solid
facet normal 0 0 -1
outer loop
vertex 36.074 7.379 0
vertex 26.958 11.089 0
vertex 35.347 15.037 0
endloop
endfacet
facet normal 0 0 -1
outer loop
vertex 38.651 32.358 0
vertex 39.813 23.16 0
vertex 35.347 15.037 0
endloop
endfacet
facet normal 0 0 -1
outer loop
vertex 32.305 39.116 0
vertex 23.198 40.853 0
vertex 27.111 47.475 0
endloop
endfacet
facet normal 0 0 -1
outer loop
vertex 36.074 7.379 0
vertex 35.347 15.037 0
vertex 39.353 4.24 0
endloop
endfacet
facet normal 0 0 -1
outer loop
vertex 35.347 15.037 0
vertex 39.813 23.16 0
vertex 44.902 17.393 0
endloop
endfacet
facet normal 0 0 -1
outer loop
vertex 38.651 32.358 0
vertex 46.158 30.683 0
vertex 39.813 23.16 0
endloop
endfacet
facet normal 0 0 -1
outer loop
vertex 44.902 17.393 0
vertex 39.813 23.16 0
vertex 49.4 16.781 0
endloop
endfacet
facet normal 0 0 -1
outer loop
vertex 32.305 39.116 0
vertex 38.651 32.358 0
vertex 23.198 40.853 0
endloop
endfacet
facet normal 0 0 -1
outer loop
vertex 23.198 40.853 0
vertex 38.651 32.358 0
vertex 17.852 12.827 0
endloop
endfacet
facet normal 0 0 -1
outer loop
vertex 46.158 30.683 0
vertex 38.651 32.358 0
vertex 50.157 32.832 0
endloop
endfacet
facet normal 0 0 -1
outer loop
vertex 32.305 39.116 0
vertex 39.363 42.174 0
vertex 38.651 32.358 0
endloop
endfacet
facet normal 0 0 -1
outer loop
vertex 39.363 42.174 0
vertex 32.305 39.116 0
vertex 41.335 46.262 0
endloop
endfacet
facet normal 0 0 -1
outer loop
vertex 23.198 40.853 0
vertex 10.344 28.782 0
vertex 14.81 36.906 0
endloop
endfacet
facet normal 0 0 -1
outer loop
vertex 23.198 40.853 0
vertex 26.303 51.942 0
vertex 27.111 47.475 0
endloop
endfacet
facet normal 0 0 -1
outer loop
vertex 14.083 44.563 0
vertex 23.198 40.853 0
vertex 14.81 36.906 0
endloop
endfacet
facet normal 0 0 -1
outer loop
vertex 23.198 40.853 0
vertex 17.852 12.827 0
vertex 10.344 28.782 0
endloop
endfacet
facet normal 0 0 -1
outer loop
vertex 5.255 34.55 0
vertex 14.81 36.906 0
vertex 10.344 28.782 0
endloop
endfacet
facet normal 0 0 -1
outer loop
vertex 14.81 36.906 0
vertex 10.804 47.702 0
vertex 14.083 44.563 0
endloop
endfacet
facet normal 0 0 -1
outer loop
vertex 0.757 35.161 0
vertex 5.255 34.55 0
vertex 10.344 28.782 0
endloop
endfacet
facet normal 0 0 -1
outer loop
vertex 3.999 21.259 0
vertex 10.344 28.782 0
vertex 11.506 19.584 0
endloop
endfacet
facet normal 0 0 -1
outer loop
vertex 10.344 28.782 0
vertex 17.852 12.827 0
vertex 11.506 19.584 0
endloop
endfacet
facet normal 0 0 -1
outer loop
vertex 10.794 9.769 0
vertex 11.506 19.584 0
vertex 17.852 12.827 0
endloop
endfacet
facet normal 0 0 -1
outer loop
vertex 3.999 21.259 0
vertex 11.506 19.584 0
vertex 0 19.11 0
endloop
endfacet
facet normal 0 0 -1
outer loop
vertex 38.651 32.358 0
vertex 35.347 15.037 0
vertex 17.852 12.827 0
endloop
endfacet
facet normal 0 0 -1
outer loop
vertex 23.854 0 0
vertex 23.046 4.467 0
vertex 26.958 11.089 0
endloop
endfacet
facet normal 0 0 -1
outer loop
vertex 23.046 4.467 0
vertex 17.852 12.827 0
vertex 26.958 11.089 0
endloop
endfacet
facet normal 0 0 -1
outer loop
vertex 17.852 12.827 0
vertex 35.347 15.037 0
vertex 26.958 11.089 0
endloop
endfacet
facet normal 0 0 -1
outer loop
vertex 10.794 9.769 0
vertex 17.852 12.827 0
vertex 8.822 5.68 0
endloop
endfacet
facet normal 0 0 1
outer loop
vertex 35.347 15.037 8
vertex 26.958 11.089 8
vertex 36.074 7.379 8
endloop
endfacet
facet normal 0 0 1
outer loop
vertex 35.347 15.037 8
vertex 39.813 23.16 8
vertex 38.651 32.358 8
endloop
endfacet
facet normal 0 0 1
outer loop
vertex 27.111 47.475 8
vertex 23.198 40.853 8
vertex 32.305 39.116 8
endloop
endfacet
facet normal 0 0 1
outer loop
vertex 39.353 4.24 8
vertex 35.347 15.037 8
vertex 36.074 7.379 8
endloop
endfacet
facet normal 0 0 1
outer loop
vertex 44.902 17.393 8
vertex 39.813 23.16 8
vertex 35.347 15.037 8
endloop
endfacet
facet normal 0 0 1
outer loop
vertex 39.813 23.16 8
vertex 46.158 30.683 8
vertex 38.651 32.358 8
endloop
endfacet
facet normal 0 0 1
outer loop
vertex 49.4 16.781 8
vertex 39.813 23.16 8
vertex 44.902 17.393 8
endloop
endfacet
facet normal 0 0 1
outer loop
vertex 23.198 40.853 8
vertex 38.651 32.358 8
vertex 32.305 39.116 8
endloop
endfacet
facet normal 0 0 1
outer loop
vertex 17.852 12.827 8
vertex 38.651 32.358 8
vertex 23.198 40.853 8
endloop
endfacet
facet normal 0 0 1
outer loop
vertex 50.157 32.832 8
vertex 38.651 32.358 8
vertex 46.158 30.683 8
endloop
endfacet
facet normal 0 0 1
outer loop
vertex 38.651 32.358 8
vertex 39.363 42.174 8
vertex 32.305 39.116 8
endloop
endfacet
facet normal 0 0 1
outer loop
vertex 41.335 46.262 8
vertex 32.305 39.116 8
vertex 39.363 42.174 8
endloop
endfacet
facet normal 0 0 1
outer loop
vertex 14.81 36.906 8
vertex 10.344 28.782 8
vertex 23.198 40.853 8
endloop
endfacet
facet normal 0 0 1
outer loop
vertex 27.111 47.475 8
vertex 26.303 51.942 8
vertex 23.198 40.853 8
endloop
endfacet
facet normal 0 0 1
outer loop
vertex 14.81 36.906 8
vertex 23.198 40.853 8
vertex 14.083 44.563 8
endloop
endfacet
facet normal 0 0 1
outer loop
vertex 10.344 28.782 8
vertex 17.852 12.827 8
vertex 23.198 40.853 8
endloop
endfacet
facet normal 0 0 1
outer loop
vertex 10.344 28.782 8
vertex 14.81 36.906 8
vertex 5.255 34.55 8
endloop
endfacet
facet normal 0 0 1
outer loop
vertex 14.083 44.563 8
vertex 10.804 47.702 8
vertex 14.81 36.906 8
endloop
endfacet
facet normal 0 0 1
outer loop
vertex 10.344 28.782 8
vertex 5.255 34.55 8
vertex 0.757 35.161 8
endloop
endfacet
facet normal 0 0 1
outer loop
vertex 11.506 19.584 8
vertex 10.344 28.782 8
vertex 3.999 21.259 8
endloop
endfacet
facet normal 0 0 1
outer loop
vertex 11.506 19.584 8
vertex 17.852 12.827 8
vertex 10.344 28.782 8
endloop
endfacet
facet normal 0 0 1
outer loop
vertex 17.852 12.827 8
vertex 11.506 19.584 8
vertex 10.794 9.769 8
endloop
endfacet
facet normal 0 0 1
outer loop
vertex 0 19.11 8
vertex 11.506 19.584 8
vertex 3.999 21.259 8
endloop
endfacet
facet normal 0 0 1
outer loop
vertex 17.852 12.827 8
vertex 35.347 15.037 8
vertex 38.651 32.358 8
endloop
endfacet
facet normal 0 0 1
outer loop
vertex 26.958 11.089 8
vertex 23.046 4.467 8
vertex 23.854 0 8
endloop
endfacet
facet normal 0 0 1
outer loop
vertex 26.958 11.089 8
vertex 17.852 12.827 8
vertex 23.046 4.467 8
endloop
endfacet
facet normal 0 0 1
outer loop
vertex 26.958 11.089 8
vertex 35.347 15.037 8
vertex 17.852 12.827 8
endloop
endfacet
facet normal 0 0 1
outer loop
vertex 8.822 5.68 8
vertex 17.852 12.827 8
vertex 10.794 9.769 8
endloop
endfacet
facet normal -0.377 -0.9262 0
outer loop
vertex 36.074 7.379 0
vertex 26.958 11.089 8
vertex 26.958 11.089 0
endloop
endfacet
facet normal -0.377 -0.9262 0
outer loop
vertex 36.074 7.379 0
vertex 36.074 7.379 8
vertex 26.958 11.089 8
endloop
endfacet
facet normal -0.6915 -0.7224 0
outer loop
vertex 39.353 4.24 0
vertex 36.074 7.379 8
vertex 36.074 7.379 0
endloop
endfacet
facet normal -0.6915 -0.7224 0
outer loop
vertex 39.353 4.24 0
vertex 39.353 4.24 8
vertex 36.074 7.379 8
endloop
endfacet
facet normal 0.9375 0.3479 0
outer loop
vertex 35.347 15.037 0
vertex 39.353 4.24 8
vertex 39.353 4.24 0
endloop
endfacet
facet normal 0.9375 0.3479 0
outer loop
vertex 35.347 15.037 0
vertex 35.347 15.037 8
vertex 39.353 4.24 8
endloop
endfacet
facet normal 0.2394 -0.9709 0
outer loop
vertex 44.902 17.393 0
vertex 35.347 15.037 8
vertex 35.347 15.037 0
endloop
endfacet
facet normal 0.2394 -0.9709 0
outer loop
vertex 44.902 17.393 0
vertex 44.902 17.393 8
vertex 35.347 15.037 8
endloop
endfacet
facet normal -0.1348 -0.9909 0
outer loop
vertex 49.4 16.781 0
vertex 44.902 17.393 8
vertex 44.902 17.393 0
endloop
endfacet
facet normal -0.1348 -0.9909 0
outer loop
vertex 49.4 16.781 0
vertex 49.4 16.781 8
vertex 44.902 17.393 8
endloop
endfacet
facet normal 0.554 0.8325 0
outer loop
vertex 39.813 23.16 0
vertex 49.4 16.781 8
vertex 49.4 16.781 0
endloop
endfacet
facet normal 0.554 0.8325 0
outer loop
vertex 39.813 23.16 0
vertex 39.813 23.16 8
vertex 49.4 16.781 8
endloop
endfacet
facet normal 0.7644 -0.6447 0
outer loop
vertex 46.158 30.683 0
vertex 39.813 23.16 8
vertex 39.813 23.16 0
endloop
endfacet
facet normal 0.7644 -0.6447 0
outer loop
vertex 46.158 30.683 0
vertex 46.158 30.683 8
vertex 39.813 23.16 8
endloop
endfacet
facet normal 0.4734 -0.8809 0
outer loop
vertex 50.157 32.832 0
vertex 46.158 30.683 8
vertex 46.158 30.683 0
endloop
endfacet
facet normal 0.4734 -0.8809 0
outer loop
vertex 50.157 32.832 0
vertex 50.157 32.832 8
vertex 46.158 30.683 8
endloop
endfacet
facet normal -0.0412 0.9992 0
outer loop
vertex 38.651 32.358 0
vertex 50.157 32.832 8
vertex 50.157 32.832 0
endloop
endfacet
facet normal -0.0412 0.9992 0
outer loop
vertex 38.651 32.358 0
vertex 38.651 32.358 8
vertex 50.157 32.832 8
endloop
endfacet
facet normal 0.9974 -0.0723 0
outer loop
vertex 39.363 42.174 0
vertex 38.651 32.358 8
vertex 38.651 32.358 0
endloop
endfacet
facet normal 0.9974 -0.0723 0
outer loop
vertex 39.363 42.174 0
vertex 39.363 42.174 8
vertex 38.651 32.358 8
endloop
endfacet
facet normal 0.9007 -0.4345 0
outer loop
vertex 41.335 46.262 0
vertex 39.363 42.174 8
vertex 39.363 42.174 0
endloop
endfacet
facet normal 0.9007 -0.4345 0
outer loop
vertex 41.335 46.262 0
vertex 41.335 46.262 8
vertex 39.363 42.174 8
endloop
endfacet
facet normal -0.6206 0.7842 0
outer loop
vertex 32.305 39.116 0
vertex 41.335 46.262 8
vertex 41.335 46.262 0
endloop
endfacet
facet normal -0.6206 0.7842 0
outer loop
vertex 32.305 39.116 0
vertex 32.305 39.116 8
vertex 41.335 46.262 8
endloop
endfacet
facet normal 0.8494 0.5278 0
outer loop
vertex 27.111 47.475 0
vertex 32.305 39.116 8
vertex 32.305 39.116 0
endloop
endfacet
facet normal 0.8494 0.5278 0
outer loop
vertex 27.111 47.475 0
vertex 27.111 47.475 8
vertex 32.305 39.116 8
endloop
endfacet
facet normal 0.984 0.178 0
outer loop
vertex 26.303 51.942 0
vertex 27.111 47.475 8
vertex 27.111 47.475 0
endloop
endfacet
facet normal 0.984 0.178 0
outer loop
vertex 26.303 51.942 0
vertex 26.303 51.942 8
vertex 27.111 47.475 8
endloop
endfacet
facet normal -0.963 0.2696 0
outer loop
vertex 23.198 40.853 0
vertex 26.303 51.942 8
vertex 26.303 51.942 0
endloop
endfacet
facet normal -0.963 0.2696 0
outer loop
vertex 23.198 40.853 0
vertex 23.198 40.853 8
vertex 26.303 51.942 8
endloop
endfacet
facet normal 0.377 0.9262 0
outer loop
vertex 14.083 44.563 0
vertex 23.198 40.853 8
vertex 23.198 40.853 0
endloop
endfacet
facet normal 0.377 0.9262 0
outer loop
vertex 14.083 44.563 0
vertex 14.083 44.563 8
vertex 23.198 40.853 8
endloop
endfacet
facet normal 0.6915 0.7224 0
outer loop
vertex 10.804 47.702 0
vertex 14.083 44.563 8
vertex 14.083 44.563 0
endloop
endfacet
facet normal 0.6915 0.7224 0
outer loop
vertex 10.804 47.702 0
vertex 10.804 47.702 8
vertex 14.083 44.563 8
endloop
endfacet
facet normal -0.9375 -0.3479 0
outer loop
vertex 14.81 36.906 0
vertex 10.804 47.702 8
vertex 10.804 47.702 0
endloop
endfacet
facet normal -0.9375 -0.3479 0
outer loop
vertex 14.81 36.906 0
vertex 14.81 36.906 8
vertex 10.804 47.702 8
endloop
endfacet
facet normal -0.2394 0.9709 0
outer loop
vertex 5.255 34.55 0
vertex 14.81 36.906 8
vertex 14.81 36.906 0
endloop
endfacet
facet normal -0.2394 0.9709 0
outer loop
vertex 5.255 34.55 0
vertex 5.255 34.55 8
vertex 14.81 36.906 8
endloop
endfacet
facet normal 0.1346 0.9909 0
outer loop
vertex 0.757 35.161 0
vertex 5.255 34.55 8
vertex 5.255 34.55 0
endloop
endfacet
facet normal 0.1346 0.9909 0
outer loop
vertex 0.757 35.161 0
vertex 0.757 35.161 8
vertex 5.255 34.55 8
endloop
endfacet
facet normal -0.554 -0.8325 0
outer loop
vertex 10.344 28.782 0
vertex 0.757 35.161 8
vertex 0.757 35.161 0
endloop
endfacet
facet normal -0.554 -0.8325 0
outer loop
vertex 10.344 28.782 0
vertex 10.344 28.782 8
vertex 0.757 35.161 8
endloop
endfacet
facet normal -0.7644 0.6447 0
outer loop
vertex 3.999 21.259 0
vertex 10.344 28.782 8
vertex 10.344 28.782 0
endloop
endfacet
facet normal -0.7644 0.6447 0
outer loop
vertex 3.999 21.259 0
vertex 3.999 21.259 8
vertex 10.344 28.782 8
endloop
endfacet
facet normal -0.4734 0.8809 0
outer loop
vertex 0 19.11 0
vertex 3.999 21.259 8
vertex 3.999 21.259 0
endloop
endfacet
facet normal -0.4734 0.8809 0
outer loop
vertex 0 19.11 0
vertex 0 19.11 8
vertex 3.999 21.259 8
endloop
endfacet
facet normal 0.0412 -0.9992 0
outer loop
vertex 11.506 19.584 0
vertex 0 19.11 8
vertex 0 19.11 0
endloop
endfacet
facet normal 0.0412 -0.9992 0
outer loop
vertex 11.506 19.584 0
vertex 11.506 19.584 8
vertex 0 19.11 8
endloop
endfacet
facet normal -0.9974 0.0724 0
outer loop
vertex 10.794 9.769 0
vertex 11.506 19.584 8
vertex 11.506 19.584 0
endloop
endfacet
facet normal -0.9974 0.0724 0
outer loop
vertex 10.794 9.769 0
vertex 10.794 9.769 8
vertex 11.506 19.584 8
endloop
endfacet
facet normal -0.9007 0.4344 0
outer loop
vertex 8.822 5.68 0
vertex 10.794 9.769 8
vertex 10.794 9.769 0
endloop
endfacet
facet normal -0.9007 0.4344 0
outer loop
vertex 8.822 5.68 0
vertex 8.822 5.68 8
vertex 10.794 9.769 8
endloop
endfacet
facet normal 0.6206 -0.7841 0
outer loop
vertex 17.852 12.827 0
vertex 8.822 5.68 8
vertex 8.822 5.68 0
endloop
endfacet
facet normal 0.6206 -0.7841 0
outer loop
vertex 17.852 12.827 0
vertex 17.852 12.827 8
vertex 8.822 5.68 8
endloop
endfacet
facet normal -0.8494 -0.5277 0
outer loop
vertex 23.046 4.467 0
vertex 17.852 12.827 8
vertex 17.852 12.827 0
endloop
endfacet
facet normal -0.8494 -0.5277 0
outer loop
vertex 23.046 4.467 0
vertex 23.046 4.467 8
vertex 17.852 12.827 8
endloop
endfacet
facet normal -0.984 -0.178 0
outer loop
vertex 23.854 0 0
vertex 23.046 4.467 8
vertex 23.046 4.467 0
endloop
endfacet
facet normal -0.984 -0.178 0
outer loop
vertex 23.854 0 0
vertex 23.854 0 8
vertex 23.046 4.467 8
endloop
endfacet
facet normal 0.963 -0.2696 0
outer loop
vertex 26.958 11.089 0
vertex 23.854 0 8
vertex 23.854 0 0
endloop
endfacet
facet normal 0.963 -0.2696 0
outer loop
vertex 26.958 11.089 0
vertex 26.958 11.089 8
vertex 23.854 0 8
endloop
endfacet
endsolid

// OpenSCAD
$fn = 32;

// ----------------------------------------------------------------------
// Fan rotor section: 10 blades, 15 mm hub radius, 11 mm blades
// ----------------------------------------------------------------------

// --- parameters (mm) ---
profile_height = 8;       // extrusion height
profile_points = 30;      // points of the closed outline

profile = [[39.813, 23.16], [46.158, 30.683], [50.157, 32.832], [38.651, 32.358], [39.363, 42.174], [41.335, 46.262], [32.305, 39.116], [27.111, 47.475], [26.303, 51.942], [23.198, 40.853], [14.083, 44.563], [10.804, 47.702], [14.81, 36.906], [5.255, 34.55], [0.757, 35.161], [10.344, 28.782], [3.999, 21.259], [0, 19.11], [11.506, 19.584], [10.794, 9.769], [8.822, 5.68], [17.852, 12.827], [23.046, 4.467], [23.854, 0], [26.958, 11.089], [36.074, 7.379], [39.353, 4.24], [35.347, 15.037], [44.902, 17.393], [49.4, 16.781]];  // single closed polygon, 30 points, counter clockwise

// --- the one profile operation ---
linear_extrude(height = profile_height) polygon(points = profile);
